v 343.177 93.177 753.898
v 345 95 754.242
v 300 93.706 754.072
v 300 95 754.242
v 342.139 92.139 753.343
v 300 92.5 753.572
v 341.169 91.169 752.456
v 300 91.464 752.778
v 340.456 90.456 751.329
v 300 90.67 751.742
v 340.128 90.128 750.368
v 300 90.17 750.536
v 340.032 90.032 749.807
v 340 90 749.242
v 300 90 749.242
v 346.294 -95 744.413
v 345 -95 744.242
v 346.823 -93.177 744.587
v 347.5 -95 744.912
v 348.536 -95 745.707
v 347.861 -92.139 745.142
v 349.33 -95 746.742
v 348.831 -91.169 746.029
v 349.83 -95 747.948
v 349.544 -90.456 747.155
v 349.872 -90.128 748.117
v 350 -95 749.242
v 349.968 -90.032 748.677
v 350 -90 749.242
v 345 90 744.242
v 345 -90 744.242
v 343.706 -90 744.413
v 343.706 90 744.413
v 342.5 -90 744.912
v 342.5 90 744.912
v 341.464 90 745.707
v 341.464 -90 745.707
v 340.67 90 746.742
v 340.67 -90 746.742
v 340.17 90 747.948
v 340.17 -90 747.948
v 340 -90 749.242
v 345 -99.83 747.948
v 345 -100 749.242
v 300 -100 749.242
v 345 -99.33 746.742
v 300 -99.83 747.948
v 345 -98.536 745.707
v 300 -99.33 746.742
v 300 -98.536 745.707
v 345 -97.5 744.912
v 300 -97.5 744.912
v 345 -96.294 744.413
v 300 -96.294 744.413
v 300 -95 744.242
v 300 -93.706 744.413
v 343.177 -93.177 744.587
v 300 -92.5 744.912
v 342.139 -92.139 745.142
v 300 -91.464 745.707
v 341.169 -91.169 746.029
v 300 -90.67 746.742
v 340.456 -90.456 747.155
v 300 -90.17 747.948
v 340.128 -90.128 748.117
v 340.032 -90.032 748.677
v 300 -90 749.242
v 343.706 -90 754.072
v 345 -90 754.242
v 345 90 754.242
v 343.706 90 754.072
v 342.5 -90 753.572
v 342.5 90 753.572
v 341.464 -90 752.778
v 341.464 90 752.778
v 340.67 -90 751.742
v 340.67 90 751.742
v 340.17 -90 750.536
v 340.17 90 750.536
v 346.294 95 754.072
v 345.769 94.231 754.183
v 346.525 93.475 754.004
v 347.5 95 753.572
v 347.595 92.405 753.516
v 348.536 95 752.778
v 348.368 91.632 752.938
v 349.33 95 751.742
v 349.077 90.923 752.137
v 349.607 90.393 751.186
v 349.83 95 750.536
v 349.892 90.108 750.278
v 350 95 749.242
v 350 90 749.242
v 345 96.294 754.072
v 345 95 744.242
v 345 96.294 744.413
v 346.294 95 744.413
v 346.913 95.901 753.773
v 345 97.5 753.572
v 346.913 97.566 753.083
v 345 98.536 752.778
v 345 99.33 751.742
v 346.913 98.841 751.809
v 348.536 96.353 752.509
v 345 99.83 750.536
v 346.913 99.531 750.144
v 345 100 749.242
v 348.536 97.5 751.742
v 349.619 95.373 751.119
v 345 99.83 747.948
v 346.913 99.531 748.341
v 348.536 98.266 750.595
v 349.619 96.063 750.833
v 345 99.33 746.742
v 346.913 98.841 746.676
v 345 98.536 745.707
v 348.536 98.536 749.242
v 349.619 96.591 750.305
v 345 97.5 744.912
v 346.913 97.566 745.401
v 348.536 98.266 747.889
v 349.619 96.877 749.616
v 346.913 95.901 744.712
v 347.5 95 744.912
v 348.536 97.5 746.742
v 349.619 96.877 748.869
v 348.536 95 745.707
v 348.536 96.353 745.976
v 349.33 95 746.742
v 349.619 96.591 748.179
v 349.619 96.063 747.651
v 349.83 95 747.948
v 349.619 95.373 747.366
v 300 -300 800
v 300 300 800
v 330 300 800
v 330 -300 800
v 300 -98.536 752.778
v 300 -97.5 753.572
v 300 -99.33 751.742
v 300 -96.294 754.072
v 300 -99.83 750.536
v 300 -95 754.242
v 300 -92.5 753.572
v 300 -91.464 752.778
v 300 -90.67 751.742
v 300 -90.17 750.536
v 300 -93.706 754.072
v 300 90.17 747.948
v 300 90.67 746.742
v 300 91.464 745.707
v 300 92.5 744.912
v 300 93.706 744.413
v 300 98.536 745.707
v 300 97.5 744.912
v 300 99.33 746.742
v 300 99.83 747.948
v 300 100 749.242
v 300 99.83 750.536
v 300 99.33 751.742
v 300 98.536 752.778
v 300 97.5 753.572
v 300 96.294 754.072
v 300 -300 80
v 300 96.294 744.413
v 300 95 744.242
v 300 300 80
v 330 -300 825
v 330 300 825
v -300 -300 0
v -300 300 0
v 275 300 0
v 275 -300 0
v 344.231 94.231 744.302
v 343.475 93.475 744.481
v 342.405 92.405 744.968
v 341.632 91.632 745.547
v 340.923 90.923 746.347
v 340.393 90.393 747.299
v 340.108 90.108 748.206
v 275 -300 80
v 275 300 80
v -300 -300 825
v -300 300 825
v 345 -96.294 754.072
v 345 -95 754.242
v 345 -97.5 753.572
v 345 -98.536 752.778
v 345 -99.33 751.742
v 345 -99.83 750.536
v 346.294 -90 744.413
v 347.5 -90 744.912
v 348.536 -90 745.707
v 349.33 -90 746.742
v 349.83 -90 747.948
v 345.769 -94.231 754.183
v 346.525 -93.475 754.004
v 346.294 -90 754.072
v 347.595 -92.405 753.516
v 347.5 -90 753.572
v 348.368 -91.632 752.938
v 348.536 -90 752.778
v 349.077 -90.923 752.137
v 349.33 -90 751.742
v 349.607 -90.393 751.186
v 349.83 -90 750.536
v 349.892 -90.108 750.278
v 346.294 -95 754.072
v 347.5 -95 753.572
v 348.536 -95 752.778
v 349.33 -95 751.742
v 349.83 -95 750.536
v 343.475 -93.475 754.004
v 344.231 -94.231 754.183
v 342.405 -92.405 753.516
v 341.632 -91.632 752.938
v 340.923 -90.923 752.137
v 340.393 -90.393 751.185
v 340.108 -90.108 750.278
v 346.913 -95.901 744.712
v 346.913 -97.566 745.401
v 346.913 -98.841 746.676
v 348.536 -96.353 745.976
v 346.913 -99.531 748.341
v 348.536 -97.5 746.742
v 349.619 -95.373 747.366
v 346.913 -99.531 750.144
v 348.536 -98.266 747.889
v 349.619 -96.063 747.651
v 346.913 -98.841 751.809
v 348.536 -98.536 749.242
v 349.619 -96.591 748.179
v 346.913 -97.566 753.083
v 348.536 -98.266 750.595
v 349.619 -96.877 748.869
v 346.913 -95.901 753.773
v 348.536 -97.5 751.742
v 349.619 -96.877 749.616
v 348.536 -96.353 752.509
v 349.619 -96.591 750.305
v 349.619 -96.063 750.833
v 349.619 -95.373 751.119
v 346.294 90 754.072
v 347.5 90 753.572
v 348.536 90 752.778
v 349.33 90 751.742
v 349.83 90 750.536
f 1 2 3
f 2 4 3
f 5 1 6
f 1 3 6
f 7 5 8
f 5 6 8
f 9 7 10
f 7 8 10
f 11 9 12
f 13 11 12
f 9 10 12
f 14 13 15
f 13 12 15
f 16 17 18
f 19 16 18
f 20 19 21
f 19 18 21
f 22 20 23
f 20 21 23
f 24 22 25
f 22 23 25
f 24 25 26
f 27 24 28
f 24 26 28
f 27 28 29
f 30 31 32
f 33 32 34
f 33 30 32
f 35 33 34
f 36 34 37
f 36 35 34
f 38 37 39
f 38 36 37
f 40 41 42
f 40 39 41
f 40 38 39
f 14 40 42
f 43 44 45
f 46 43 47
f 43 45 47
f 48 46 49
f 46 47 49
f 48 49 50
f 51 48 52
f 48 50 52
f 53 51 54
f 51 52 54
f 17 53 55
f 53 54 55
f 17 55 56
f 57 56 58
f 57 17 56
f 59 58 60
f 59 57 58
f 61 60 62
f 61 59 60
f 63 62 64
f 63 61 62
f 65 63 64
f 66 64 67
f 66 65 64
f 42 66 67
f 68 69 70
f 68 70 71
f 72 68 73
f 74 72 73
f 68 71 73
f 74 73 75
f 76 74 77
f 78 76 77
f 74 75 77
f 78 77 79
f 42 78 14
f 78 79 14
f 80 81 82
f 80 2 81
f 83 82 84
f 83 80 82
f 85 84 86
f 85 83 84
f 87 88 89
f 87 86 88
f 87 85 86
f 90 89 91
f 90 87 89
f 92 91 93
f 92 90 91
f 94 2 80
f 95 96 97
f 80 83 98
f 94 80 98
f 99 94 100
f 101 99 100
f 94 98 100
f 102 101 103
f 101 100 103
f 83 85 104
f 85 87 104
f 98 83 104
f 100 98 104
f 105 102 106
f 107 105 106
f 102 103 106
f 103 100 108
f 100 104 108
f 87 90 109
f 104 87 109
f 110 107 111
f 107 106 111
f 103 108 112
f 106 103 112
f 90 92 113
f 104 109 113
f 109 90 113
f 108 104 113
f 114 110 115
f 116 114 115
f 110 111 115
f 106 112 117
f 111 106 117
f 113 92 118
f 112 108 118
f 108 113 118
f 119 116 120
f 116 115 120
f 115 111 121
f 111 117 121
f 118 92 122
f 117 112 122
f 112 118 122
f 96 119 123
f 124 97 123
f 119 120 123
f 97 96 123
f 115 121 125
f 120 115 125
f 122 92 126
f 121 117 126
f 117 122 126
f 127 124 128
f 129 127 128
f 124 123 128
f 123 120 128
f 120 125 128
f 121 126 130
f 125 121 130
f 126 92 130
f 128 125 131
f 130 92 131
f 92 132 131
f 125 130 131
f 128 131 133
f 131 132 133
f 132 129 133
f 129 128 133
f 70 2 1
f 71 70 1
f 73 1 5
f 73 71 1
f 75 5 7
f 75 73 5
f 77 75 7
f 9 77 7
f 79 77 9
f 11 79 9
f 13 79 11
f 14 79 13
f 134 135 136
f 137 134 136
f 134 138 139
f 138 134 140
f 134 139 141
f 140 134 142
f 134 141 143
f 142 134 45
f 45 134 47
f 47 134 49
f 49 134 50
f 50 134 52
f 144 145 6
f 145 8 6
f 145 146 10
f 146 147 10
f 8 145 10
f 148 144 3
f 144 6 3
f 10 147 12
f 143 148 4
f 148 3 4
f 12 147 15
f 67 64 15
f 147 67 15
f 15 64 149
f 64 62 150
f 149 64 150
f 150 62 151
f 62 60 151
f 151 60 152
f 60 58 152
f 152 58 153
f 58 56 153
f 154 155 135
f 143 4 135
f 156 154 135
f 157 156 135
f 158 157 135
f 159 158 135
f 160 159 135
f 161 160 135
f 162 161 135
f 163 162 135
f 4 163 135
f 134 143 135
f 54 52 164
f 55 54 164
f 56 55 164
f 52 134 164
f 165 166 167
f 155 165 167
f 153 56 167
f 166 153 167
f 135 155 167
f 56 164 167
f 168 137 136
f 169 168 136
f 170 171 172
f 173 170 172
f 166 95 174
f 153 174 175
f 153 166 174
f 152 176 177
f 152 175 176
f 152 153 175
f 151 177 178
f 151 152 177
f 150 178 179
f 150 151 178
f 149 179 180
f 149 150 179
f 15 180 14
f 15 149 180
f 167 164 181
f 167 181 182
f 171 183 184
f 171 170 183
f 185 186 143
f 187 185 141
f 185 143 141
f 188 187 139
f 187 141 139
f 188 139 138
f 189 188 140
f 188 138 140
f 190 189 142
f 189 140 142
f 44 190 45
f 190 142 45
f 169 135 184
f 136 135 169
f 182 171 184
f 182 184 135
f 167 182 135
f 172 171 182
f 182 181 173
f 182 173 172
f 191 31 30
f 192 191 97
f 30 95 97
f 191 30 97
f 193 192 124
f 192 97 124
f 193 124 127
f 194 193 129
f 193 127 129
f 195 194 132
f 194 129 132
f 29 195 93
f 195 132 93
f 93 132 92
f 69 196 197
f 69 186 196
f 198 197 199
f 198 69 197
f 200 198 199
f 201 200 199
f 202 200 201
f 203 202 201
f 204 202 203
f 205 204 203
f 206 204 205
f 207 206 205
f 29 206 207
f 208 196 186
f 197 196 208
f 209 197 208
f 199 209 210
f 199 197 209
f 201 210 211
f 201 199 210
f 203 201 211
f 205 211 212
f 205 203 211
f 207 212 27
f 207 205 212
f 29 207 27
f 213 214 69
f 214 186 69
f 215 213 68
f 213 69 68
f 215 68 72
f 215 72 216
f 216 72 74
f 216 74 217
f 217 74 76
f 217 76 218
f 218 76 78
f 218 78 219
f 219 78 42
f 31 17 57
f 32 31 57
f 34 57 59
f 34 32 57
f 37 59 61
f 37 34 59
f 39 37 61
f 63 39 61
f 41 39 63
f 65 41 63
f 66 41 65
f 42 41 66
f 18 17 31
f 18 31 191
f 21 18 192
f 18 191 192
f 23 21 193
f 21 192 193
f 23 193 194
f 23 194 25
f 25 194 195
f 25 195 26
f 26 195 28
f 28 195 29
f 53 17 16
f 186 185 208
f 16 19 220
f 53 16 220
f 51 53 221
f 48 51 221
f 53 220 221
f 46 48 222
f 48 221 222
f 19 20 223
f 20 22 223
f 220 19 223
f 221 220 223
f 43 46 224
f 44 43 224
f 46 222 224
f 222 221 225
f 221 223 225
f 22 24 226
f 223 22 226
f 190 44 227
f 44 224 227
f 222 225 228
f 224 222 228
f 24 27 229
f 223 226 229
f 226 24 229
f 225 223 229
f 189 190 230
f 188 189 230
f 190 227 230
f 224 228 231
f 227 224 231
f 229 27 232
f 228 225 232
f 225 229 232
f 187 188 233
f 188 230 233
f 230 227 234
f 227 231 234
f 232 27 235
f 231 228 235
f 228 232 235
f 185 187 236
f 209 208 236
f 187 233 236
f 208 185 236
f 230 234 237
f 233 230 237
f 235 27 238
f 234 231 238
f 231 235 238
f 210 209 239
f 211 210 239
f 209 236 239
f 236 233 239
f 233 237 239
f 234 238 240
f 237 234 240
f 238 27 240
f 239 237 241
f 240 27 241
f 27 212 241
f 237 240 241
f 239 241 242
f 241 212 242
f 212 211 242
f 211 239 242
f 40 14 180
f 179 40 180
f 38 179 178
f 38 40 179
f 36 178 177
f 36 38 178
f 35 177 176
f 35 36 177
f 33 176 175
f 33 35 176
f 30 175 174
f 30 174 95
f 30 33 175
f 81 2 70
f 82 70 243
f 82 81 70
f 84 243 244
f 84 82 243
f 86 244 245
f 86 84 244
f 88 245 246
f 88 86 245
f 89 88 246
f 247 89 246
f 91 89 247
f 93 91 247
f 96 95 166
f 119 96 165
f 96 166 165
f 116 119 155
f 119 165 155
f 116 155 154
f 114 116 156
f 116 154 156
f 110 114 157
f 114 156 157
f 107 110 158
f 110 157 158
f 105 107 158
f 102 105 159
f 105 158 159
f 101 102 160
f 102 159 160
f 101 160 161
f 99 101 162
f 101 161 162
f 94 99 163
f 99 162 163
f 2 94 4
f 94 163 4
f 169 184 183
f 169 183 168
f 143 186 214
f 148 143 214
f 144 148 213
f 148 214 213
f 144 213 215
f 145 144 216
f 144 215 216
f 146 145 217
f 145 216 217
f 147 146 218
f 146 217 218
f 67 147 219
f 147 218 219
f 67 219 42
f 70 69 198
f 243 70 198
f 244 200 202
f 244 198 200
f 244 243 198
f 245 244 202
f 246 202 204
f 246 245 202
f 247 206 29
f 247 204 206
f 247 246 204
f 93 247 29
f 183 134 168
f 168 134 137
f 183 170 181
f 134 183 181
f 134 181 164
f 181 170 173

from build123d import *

# Parameters (mm, degrees)
F0_W          = 600
F0_H          = 600
F1_DEPTH      = 800
F2_W          = 600
F2_H          = 80
F3_DEPTH      = 25
F4_W          = 630
F4_H          = 600
F5_DEPTH      = 25
F7_DEPTH      = 50
F8_W          = 40
F8_H          = 180
F9_DEPTH      = 25
F10_T1_DEPTH  = 190
F10_T4_ANGLE  = 180
F10_T8_DEPTH  = 52.5
F10_S9_R      = 5
F10_T10_DEPTH = 28
F10_T14_DEPTH = 205
F10_S15_R     = 5
F10_T16_DEPTH = 104
F10_S17_R     = 5
F10_T18_DEPTH = 104
F10_T22_DEPTH = 52.5
F10_S23_R     = 5
F10_T24_DEPTH = 28
F10_T28_DEPTH = 52.5
F10_S29_R     = 5
F10_T30_DEPTH = 28
F10_T34_DEPTH = 205
F10_S35_R     = 5
F10_T36_DEPTH = 104
F10_S37_R     = 5
F10_T38_DEPTH = 104
F10_T42_DEPTH = 52.5
F10_S43_R     = 5
F10_T44_DEPTH = 28
F10_T46_ANGLE = 180


# Not quite as in the source:
# - a fillet or chamfer that OpenCascade refuses, or shapes differently, is made with other operations: its cross-section is extruded or revolved along the edge and cut away or added


with BuildPart() as f1:
    # F0 (on Top) → F1 (new body)
    with BuildSketch(Plane.XY):
        Rectangle(F0_W, F0_H)
    extrude(amount=F1_DEPTH)

    # F2 (on face) → F3 (cut)
    with BuildSketch(Plane.YZ.offset(300)):
        with Locations((0, 40)):
            Rectangle(F2_W, F2_H)
    extrude(amount=-F3_DEPTH, mode=Mode.SUBTRACT)

    # F4 (on face) → F5 (join)
    with BuildSketch(Plane.XY.offset(800)):
        with Locations((15, 0)):
            Rectangle(F4_W, F4_H)
    extrude(amount=F5_DEPTH)

    # F6 (on face) → F7 (join)
    with BuildSketch(Plane.YZ.offset(300)):
        with BuildLine():
            ThreePointArc((100, 749.2423057556), (98.5355339059, 752.7778396615), (95, 754.2423057556))
            Line((95, 754.2423057556), (-95, 754.2423057556))
            ThreePointArc((-95, 754.2423057556), (-98.5355339059, 752.7778396615), (-100, 749.2423057556))
            ThreePointArc((-100, 749.2423057556), (-98.5355339059, 745.7067718497), (-95, 744.2423057556))
            Line((-95, 744.2423057556), (95, 744.2423057556))
            ThreePointArc((95, 744.2423057556), (98.5355339059, 745.7067718497), (100, 749.2423057556))
        make_face()
    extrude(amount=F7_DEPTH)

    # F8 (on face) → F9 (cut)
    with BuildSketch(Plane(origin=(0, 0, 744.2423057556), x_dir=(1, 0, 0), z_dir=(0, 0, -1))):
        with Locations((320, 0)):
            Rectangle(F8_W, F8_H)
    extrude(amount=-F9_DEPTH, mode=Mode.SUBTRACT)

    # F10: fillet of radius 5 on 10 edges, made by hand

    # F10_s2 → F10_t1 (cut)
    with BuildSketch(Plane.XZ.offset(-95)):
        with BuildLine():
            ThreePointArc((345, 754.2423057556), (348.5355339059, 752.7778396615), (350, 749.2423057556))
            Line((350, 749.2423057556), (350, 754.2423057556))
            Line((350, 754.2423057556), (345, 754.2423057556))
        make_face()
        with BuildLine():
            ThreePointArc((345, 744.2423057556), (348.5355339059, 745.7067718497), (350, 749.2423057556))
            Line((350, 749.2423057556), (350, 744.2423057556))
            Line((350, 744.2423057556), (345, 744.2423057556))
        make_face()
    extrude(amount=F10_T1_DEPTH, mode=Mode.SUBTRACT)

    # F10_s3 → F10_t4 (revolve, cut)
    with BuildSketch(Plane.XZ.offset(-95)):
        with BuildLine():
            ThreePointArc((345, 754.2423057556), (348.5355339059, 752.7778396615), (350, 749.2423057556))
            Line((350, 749.2423057556), (350, 754.2423057556))
            Line((350, 754.2423057556), (345, 754.2423057556))
        make_face()
    revolve(axis=Axis((350, 95, 749.2423057556), (-1, 0, 0)), revolution_arc=F10_T4_ANGLE, mode=Mode.SUBTRACT)


with BuildPart() as f10_tool6:
    # F10_s7 → F10_t8 (new body)
    with BuildSketch(Plane.YZ.offset(300)):
        with BuildLine():
            ThreePointArc((95, 744.2423057556), (91.4644660941, 745.7067718497), (90, 749.2423057556))
            Line((90, 749.2423057556), (90, 744.2423057556))
            Line((90, 744.2423057556), (95, 744.2423057556))
        make_face()
    extrude(amount=F10_T8_DEPTH)

    # F10_s9 → F10_t10 (cut, symmetric)
    with BuildSketch(Plane.XZ.offset(-92.5)):
        with Locations((345, 749.2423057556)):
            Circle(F10_S9_R)
    extrude(amount=F10_T10_DEPTH, both=True, mode=Mode.SUBTRACT)


with BuildPart() as f1_1:
    add(f1.part)

    # F10_t5: cut F10_tool6
    add(f10_tool6.part, mode=Mode.SUBTRACT)


with BuildPart() as f10_tool12:
    # F10_s13 → F10_t14 (new body)
    with BuildSketch(Plane.XZ.offset(-102.5)):
        with BuildLine():
            ThreePointArc((345, 744.2423057556), (341.4644660941, 745.7067718497), (340, 749.2423057556))
            Line((340, 749.2423057556), (340, 744.2423057556))
            Line((340, 744.2423057556), (345, 744.2423057556))
        make_face()
    extrude(amount=F10_T14_DEPTH)

    # F10_s15 → F10_t16 (cut, symmetric)
    with BuildSketch(Plane.YZ.offset(342.5)):
        with Locations((-95, 749.2423057556)):
            Circle(F10_S15_R)
    extrude(amount=F10_T16_DEPTH, both=True, mode=Mode.SUBTRACT)

    # F10_s17 → F10_t18 (cut, symmetric)
    with BuildSketch(Plane.YZ.offset(342.5)):
        with Locations((95, 749.2423057556)):
            Circle(F10_S17_R)
    extrude(amount=F10_T18_DEPTH, both=True, mode=Mode.SUBTRACT)


with BuildPart() as f1_2:
    add(f1_1.part)

    # F10_t11: cut F10_tool12
    add(f10_tool12.part, mode=Mode.SUBTRACT)


with BuildPart() as f10_tool20:
    # F10_s21 → F10_t22 (new body)
    with BuildSketch(Plane.YZ.offset(352.5)):
        with BuildLine():
            ThreePointArc((-95, 744.2423057556), (-91.4644660941, 745.7067718497), (-90, 749.2423057556))
            Line((-90, 749.2423057556), (-90, 744.2423057556))
            Line((-90, 744.2423057556), (-95, 744.2423057556))
        make_face()
    extrude(amount=-F10_T22_DEPTH)

    # F10_s23 → F10_t24 (cut, symmetric)
    with BuildSketch(Plane.XZ.offset(92.5)):
        with Locations((345, 749.2423057556)):
            Circle(F10_S23_R)
    extrude(amount=F10_T24_DEPTH, both=True, mode=Mode.SUBTRACT)


with BuildPart() as f1_3:
    add(f1_2.part)

    # F10_t19: cut F10_tool20
    add(f10_tool20.part, mode=Mode.SUBTRACT)


with BuildPart() as f10_tool26:
    # F10_s27 → F10_t28 (new body)
    with BuildSketch(Plane.YZ.offset(300)):
        with BuildLine():
            ThreePointArc((95, 754.2423057556), (91.4644660941, 752.7778396615), (90, 749.2423057556))
            Line((90, 749.2423057556), (90, 754.2423057556))
            Line((90, 754.2423057556), (95, 754.2423057556))
        make_face()
    extrude(amount=F10_T28_DEPTH)

    # F10_s29 → F10_t30 (cut, symmetric)
    with BuildSketch(Plane.XZ.offset(-92.5)):
        with Locations((345, 749.2423057556)):
            Circle(F10_S29_R)
    extrude(amount=F10_T30_DEPTH, both=True, mode=Mode.SUBTRACT)


with BuildPart() as f1_4:
    add(f1_3.part)

    # F10_t25: cut F10_tool26
    add(f10_tool26.part, mode=Mode.SUBTRACT)


with BuildPart() as f10_tool32:
    # F10_s33 → F10_t34 (new body)
    with BuildSketch(Plane.XZ.offset(-102.5)):
        with BuildLine():
            ThreePointArc((345, 754.2423057556), (341.4644660941, 752.7778396615), (340, 749.2423057556))
            Line((340, 749.2423057556), (340, 754.2423057556))
            Line((340, 754.2423057556), (345, 754.2423057556))
        make_face()
    extrude(amount=F10_T34_DEPTH)

    # F10_s35 → F10_t36 (cut, symmetric)
    with BuildSketch(Plane.YZ.offset(342.5)):
        with Locations((95, 749.2423057556)):
            Circle(F10_S35_R)
    extrude(amount=F10_T36_DEPTH, both=True, mode=Mode.SUBTRACT)

    # F10_s37 → F10_t38 (cut, symmetric)
    with BuildSketch(Plane.YZ.offset(342.5)):
        with Locations((-95, 749.2423057556)):
            Circle(F10_S37_R)
    extrude(amount=F10_T38_DEPTH, both=True, mode=Mode.SUBTRACT)


with BuildPart() as f1_5:
    add(f1_4.part)

    # F10_t31: cut F10_tool32
    add(f10_tool32.part, mode=Mode.SUBTRACT)


with BuildPart() as f10_tool40:
    # F10_s41 → F10_t42 (new body)
    with BuildSketch(Plane.YZ.offset(352.5)):
        with BuildLine():
            ThreePointArc((-95, 754.2423057556), (-91.4644660941, 752.7778396615), (-90, 749.2423057556))
            Line((-90, 749.2423057556), (-90, 754.2423057556))
            Line((-90, 754.2423057556), (-95, 754.2423057556))
        make_face()
    extrude(amount=-F10_T42_DEPTH)

    # F10_s43 → F10_t44 (cut, symmetric)
    with BuildSketch(Plane.XZ.offset(92.5)):
        with Locations((345, 749.2423057556)):
            Circle(F10_S43_R)
    extrude(amount=F10_T44_DEPTH, both=True, mode=Mode.SUBTRACT)


with BuildPart() as f1_6:
    add(f1_5.part)

    # F10_t39: cut F10_tool40
    add(f10_tool40.part, mode=Mode.SUBTRACT)

    # F10_s45 → F10_t46 (revolve, cut)
    with BuildSketch(Plane.XZ.offset(95)):
        with BuildLine():
            ThreePointArc((345, 744.2423057556), (348.5355339059, 745.7067718497), (350, 749.2423057556))
            Line((350, 749.2423057556), (350, 744.2423057556))
            Line((350, 744.2423057556), (345, 744.2423057556))
        make_face()
    revolve(axis=Axis((350, -95, 749.2423057556), (-1, 0, 0)), revolution_arc=F10_T46_ANGLE, mode=Mode.SUBTRACT)


solid = f1_6.part
